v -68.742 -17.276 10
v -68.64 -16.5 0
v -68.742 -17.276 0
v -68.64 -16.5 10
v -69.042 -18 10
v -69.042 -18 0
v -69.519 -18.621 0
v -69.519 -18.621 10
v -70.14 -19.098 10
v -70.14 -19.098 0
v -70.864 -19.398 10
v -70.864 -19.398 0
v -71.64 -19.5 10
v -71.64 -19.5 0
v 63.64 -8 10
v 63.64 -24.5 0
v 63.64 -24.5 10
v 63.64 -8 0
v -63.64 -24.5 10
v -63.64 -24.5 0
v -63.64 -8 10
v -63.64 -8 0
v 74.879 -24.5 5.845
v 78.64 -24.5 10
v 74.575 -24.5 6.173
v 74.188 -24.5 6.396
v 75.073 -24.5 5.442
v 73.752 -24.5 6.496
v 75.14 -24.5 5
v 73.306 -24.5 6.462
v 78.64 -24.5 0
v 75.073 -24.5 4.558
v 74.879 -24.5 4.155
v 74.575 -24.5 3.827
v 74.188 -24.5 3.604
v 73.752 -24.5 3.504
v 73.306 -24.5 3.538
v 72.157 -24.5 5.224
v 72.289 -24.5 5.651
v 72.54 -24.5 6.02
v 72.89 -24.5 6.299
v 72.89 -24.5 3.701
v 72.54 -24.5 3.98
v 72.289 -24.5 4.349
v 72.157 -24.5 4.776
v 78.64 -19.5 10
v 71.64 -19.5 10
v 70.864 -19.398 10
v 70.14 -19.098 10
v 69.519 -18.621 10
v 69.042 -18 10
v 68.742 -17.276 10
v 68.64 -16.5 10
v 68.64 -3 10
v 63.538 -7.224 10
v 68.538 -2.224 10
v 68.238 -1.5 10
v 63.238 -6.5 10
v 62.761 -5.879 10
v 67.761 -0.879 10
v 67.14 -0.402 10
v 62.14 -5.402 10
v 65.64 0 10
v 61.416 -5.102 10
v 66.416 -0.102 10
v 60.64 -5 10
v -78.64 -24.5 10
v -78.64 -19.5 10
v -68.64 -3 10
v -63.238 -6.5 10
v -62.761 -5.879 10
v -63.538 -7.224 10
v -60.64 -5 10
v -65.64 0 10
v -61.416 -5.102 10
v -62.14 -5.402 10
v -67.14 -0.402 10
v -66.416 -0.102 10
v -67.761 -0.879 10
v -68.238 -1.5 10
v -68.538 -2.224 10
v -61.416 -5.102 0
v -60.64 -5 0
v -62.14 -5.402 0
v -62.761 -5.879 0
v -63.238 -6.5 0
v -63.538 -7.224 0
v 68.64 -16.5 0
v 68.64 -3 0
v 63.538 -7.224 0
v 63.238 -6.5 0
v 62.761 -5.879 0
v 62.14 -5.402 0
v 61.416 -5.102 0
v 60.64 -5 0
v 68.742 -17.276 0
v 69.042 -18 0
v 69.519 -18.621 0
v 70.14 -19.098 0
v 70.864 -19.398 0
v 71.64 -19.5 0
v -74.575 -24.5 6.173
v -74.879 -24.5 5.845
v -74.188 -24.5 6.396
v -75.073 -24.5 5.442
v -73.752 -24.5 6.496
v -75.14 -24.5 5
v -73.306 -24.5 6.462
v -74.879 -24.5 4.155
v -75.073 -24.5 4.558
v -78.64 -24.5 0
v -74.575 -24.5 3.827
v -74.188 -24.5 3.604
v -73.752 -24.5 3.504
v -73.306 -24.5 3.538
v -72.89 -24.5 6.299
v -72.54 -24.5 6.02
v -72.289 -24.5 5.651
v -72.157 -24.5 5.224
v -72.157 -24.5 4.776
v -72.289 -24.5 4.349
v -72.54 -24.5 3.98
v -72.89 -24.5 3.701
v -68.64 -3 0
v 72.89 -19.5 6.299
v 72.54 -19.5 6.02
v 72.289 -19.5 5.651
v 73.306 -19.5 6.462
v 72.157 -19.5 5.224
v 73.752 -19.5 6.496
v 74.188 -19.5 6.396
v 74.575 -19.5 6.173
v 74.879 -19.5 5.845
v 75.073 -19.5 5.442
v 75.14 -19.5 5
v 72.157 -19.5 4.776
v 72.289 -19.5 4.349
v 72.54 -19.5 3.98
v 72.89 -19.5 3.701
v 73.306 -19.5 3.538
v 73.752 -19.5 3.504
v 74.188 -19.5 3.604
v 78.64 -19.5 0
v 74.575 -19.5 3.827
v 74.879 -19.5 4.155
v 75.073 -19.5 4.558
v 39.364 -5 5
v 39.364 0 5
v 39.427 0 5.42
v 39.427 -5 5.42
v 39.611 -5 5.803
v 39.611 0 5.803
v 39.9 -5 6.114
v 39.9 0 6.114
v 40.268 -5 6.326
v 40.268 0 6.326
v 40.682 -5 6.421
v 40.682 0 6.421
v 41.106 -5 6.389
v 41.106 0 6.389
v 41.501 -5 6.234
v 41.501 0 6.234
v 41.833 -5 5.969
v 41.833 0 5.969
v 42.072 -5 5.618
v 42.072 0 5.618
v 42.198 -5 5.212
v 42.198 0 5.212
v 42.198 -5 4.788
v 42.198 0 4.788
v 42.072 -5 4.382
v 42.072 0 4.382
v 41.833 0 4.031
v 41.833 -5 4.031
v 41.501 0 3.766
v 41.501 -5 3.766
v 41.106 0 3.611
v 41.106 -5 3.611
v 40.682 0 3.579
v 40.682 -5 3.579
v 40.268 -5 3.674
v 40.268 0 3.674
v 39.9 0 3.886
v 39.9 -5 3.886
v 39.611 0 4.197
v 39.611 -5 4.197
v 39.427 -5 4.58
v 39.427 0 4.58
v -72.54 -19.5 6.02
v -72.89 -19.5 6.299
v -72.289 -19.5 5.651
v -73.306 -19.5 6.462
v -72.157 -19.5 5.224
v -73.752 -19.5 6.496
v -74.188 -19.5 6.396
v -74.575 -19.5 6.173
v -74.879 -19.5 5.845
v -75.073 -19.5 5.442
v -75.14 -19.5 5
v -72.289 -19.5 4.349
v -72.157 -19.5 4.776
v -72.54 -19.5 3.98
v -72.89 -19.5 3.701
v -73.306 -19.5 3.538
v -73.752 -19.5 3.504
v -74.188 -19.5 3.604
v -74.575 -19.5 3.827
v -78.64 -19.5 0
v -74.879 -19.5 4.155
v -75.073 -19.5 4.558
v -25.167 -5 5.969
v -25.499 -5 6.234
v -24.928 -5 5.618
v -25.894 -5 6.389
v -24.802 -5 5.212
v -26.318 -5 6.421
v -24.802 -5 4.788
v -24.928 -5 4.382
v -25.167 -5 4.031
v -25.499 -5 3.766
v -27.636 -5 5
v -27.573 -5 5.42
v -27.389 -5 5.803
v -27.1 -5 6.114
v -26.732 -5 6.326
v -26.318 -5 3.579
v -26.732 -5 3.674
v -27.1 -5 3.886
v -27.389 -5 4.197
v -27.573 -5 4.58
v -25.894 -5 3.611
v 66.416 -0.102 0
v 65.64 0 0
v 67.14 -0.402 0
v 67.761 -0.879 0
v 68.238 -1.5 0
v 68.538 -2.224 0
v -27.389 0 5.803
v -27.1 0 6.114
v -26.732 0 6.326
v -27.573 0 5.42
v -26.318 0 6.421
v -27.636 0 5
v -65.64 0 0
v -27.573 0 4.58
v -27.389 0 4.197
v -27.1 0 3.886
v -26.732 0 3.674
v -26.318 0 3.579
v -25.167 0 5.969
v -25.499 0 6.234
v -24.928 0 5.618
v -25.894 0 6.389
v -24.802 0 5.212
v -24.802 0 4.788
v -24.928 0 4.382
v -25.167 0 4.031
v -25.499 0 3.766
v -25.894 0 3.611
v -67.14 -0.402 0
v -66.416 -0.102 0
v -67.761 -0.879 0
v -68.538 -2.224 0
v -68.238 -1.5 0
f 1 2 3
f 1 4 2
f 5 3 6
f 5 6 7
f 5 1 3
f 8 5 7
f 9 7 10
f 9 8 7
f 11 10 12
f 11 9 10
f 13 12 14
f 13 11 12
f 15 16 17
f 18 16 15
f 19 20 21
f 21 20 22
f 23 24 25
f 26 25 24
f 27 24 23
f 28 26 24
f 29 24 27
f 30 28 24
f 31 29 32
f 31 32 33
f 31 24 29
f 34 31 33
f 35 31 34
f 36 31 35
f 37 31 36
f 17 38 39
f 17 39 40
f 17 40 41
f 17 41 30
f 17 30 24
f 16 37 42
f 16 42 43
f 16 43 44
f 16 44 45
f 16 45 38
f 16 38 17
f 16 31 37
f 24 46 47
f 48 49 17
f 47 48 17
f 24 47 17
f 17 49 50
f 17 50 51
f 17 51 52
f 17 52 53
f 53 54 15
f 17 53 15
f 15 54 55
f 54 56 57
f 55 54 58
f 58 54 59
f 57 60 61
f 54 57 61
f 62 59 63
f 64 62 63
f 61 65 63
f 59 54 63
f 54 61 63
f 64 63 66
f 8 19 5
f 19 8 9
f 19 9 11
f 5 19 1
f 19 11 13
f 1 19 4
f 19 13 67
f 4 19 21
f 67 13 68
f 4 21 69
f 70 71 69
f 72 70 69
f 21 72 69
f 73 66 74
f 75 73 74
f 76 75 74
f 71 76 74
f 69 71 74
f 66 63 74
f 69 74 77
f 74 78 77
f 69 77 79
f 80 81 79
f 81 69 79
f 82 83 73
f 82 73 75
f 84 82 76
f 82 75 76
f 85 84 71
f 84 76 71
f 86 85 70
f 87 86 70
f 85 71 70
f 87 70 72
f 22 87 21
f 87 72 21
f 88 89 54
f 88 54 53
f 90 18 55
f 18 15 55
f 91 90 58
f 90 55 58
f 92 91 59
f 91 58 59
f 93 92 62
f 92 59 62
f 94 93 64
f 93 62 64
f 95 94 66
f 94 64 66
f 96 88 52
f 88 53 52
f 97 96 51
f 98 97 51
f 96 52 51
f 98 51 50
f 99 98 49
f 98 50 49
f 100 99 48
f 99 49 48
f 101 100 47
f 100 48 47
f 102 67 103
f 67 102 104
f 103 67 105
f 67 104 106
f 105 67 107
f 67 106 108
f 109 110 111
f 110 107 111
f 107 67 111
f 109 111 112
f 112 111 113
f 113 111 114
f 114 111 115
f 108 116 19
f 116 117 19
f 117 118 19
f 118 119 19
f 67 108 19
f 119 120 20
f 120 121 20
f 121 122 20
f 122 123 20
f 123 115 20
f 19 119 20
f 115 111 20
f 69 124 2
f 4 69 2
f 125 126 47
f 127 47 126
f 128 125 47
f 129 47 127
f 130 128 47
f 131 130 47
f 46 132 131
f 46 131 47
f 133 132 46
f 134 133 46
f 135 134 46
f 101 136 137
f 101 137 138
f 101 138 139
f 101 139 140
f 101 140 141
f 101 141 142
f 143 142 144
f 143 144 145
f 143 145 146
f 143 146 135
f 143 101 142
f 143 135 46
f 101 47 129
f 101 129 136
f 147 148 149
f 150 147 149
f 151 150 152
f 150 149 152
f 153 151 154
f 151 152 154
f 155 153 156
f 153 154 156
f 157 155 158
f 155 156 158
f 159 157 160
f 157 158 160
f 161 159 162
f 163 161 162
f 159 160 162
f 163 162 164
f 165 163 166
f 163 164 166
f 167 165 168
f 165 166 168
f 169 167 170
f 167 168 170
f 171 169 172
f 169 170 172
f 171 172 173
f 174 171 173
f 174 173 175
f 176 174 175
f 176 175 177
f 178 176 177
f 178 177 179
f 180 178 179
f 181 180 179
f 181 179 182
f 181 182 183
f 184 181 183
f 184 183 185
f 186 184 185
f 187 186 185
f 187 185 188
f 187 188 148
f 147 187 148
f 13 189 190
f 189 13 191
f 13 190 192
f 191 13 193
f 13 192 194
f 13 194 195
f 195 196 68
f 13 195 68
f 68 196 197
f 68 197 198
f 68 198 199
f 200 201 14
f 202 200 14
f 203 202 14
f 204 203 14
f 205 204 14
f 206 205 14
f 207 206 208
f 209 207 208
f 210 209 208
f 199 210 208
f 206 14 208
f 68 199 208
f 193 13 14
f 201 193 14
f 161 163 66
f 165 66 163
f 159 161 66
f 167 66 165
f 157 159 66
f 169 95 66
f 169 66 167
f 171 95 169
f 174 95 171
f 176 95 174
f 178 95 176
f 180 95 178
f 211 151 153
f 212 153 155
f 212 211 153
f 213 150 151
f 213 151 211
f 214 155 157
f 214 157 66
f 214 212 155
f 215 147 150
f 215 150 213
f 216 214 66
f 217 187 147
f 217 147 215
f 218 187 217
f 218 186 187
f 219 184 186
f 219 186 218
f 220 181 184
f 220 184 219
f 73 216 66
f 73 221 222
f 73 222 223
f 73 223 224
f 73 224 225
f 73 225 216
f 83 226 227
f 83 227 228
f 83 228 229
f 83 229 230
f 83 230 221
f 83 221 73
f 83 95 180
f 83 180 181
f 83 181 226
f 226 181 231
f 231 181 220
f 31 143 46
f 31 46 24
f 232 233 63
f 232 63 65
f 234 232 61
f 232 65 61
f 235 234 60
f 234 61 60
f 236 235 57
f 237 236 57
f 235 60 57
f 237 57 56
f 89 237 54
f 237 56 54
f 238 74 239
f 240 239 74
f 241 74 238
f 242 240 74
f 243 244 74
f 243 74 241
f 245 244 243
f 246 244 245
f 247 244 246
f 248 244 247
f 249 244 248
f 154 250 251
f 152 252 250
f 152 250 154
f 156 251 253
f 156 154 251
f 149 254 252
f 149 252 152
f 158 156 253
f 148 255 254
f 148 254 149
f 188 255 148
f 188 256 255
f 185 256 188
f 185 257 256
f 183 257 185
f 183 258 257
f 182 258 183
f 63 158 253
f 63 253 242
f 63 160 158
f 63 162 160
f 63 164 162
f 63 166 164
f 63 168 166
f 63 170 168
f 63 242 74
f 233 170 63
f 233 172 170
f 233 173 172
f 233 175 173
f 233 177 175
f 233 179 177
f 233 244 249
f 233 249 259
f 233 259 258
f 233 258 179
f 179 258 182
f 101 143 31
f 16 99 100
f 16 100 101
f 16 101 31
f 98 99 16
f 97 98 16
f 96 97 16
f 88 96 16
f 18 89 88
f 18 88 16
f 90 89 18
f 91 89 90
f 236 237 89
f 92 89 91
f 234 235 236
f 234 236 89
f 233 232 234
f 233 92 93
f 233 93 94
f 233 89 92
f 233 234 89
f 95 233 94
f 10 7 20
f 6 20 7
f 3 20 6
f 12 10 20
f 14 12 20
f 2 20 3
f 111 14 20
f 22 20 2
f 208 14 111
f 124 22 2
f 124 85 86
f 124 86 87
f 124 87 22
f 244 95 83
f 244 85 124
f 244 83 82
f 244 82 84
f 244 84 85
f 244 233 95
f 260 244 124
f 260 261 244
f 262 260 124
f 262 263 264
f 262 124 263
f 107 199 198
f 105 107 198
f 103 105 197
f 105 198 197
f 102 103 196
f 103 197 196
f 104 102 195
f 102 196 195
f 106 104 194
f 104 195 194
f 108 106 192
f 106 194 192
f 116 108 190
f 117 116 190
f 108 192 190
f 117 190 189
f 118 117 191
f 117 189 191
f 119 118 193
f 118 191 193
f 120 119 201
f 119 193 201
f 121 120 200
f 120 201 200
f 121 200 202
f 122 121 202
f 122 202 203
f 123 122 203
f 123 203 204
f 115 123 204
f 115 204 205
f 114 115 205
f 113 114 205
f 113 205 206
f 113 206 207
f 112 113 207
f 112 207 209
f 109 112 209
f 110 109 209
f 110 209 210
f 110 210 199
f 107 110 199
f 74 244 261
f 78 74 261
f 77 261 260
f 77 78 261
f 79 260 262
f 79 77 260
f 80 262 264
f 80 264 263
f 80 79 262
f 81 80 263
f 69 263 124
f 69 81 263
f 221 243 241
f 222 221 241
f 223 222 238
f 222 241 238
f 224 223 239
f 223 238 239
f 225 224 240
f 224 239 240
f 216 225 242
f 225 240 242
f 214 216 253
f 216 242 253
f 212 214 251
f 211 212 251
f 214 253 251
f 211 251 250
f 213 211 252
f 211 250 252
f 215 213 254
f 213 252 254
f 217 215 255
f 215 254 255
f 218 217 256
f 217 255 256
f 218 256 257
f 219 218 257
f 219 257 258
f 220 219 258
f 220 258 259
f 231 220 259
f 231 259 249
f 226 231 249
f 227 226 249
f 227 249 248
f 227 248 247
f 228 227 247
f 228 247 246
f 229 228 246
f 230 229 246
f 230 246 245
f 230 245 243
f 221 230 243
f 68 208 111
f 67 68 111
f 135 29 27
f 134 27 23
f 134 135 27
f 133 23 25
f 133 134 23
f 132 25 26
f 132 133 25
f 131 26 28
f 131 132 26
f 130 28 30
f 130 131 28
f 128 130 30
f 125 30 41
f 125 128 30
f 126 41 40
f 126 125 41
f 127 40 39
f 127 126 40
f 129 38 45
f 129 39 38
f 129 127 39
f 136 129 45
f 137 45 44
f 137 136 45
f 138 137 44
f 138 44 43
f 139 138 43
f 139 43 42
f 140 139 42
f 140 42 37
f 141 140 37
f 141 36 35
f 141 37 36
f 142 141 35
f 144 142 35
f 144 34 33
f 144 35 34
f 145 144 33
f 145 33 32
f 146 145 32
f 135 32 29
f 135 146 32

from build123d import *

# Parameters (mm, degrees)
BOSS_EXTRUDE1_DEPTH  = 10
SKETCH2_R            = 1.5
CUT_EXTRUDE1_DEPTH   = 10
FILLET1_R            = 3
FILLET1_OF_MIRROR1_R = 3
SKETCH3_R            = 1.425
CUT_EXTRUDE2_DEPTH   = 10


with BuildPart() as part:
    # Sketch1 → Boss-Extrude1 (new body)
    with BuildSketch(Plane.XY):
        Polygon((0, 0), (-68.64, 0), (-68.64, -19.5), (-78.64, -19.5), (-78.64, -24.5), (-63.64, -24.5), (-63.64, -5), (0, -5), align=None)
    boss_extrude1 = extrude(amount=BOSS_EXTRUDE1_DEPTH)

    # Sketch2 → Cut-Extrude1 (cut)
    with BuildSketch(Plane(origin=(0, -19.5, 0), x_dir=(1, 0, 0), z_dir=(0, 1, 0))):
        with Locations(Location((-73.64, -5, 0), (0, 0, 180))):
            Circle(SKETCH2_R)
    cut_extrude1 = extrude(amount=-CUT_EXTRUDE1_DEPTH, mode=Mode.SUBTRACT)

    # Fillet1
    fillet1_edges = [part.edges().sort_by_distance(p)[0] for p in [
        (-63.64, -5, 5),
        (-68.64, -19.5, 5),
        (-68.64, 0, 5),
    ]]
    fillet(fillet1_edges, radius=FILLET1_R)

    # Mirror1: Boss-Extrude1, Cut-Extrude1 across plane
    add(boss_extrude1.mirror(Plane(origin=(0, -5, 10), x_dir=(0, 0, 1), z_dir=(-1, 0, 0))))
    add(cut_extrude1.mirror(Plane(origin=(0, -5, 10), x_dir=(0, 0, 1), z_dir=(-1, 0, 0))), mode=Mode.SUBTRACT)

    # Fillet1 of Mirror1
    fillet1_of_mirror1_edges = [part.edges().sort_by_distance(p)[0] for p in [
        (63.64, -5, 5),
        (68.64, -19.5, 5),
        (68.64, 0, 5),
    ]]
    fillet(fillet1_of_mirror1_edges, radius=FILLET1_OF_MIRROR1_R)

    # Sketch3 → Cut-Extrude2 (cut)
    with BuildSketch(Plane(origin=(0, 0, 0), x_dir=(1, 0, 0), z_dir=(0, 1, 0))):
        with Locations(Location((40.788603054, -5, 0), (0, 0, 180))):
            Circle(SKETCH3_R)
        with Locations(Location((-26.211396946, -5, 0), (0, 0, 180))):
            Circle(SKETCH3_R)
    extrude(amount=-CUT_EXTRUDE2_DEPTH, mode=Mode.SUBTRACT)


solid = part.part
